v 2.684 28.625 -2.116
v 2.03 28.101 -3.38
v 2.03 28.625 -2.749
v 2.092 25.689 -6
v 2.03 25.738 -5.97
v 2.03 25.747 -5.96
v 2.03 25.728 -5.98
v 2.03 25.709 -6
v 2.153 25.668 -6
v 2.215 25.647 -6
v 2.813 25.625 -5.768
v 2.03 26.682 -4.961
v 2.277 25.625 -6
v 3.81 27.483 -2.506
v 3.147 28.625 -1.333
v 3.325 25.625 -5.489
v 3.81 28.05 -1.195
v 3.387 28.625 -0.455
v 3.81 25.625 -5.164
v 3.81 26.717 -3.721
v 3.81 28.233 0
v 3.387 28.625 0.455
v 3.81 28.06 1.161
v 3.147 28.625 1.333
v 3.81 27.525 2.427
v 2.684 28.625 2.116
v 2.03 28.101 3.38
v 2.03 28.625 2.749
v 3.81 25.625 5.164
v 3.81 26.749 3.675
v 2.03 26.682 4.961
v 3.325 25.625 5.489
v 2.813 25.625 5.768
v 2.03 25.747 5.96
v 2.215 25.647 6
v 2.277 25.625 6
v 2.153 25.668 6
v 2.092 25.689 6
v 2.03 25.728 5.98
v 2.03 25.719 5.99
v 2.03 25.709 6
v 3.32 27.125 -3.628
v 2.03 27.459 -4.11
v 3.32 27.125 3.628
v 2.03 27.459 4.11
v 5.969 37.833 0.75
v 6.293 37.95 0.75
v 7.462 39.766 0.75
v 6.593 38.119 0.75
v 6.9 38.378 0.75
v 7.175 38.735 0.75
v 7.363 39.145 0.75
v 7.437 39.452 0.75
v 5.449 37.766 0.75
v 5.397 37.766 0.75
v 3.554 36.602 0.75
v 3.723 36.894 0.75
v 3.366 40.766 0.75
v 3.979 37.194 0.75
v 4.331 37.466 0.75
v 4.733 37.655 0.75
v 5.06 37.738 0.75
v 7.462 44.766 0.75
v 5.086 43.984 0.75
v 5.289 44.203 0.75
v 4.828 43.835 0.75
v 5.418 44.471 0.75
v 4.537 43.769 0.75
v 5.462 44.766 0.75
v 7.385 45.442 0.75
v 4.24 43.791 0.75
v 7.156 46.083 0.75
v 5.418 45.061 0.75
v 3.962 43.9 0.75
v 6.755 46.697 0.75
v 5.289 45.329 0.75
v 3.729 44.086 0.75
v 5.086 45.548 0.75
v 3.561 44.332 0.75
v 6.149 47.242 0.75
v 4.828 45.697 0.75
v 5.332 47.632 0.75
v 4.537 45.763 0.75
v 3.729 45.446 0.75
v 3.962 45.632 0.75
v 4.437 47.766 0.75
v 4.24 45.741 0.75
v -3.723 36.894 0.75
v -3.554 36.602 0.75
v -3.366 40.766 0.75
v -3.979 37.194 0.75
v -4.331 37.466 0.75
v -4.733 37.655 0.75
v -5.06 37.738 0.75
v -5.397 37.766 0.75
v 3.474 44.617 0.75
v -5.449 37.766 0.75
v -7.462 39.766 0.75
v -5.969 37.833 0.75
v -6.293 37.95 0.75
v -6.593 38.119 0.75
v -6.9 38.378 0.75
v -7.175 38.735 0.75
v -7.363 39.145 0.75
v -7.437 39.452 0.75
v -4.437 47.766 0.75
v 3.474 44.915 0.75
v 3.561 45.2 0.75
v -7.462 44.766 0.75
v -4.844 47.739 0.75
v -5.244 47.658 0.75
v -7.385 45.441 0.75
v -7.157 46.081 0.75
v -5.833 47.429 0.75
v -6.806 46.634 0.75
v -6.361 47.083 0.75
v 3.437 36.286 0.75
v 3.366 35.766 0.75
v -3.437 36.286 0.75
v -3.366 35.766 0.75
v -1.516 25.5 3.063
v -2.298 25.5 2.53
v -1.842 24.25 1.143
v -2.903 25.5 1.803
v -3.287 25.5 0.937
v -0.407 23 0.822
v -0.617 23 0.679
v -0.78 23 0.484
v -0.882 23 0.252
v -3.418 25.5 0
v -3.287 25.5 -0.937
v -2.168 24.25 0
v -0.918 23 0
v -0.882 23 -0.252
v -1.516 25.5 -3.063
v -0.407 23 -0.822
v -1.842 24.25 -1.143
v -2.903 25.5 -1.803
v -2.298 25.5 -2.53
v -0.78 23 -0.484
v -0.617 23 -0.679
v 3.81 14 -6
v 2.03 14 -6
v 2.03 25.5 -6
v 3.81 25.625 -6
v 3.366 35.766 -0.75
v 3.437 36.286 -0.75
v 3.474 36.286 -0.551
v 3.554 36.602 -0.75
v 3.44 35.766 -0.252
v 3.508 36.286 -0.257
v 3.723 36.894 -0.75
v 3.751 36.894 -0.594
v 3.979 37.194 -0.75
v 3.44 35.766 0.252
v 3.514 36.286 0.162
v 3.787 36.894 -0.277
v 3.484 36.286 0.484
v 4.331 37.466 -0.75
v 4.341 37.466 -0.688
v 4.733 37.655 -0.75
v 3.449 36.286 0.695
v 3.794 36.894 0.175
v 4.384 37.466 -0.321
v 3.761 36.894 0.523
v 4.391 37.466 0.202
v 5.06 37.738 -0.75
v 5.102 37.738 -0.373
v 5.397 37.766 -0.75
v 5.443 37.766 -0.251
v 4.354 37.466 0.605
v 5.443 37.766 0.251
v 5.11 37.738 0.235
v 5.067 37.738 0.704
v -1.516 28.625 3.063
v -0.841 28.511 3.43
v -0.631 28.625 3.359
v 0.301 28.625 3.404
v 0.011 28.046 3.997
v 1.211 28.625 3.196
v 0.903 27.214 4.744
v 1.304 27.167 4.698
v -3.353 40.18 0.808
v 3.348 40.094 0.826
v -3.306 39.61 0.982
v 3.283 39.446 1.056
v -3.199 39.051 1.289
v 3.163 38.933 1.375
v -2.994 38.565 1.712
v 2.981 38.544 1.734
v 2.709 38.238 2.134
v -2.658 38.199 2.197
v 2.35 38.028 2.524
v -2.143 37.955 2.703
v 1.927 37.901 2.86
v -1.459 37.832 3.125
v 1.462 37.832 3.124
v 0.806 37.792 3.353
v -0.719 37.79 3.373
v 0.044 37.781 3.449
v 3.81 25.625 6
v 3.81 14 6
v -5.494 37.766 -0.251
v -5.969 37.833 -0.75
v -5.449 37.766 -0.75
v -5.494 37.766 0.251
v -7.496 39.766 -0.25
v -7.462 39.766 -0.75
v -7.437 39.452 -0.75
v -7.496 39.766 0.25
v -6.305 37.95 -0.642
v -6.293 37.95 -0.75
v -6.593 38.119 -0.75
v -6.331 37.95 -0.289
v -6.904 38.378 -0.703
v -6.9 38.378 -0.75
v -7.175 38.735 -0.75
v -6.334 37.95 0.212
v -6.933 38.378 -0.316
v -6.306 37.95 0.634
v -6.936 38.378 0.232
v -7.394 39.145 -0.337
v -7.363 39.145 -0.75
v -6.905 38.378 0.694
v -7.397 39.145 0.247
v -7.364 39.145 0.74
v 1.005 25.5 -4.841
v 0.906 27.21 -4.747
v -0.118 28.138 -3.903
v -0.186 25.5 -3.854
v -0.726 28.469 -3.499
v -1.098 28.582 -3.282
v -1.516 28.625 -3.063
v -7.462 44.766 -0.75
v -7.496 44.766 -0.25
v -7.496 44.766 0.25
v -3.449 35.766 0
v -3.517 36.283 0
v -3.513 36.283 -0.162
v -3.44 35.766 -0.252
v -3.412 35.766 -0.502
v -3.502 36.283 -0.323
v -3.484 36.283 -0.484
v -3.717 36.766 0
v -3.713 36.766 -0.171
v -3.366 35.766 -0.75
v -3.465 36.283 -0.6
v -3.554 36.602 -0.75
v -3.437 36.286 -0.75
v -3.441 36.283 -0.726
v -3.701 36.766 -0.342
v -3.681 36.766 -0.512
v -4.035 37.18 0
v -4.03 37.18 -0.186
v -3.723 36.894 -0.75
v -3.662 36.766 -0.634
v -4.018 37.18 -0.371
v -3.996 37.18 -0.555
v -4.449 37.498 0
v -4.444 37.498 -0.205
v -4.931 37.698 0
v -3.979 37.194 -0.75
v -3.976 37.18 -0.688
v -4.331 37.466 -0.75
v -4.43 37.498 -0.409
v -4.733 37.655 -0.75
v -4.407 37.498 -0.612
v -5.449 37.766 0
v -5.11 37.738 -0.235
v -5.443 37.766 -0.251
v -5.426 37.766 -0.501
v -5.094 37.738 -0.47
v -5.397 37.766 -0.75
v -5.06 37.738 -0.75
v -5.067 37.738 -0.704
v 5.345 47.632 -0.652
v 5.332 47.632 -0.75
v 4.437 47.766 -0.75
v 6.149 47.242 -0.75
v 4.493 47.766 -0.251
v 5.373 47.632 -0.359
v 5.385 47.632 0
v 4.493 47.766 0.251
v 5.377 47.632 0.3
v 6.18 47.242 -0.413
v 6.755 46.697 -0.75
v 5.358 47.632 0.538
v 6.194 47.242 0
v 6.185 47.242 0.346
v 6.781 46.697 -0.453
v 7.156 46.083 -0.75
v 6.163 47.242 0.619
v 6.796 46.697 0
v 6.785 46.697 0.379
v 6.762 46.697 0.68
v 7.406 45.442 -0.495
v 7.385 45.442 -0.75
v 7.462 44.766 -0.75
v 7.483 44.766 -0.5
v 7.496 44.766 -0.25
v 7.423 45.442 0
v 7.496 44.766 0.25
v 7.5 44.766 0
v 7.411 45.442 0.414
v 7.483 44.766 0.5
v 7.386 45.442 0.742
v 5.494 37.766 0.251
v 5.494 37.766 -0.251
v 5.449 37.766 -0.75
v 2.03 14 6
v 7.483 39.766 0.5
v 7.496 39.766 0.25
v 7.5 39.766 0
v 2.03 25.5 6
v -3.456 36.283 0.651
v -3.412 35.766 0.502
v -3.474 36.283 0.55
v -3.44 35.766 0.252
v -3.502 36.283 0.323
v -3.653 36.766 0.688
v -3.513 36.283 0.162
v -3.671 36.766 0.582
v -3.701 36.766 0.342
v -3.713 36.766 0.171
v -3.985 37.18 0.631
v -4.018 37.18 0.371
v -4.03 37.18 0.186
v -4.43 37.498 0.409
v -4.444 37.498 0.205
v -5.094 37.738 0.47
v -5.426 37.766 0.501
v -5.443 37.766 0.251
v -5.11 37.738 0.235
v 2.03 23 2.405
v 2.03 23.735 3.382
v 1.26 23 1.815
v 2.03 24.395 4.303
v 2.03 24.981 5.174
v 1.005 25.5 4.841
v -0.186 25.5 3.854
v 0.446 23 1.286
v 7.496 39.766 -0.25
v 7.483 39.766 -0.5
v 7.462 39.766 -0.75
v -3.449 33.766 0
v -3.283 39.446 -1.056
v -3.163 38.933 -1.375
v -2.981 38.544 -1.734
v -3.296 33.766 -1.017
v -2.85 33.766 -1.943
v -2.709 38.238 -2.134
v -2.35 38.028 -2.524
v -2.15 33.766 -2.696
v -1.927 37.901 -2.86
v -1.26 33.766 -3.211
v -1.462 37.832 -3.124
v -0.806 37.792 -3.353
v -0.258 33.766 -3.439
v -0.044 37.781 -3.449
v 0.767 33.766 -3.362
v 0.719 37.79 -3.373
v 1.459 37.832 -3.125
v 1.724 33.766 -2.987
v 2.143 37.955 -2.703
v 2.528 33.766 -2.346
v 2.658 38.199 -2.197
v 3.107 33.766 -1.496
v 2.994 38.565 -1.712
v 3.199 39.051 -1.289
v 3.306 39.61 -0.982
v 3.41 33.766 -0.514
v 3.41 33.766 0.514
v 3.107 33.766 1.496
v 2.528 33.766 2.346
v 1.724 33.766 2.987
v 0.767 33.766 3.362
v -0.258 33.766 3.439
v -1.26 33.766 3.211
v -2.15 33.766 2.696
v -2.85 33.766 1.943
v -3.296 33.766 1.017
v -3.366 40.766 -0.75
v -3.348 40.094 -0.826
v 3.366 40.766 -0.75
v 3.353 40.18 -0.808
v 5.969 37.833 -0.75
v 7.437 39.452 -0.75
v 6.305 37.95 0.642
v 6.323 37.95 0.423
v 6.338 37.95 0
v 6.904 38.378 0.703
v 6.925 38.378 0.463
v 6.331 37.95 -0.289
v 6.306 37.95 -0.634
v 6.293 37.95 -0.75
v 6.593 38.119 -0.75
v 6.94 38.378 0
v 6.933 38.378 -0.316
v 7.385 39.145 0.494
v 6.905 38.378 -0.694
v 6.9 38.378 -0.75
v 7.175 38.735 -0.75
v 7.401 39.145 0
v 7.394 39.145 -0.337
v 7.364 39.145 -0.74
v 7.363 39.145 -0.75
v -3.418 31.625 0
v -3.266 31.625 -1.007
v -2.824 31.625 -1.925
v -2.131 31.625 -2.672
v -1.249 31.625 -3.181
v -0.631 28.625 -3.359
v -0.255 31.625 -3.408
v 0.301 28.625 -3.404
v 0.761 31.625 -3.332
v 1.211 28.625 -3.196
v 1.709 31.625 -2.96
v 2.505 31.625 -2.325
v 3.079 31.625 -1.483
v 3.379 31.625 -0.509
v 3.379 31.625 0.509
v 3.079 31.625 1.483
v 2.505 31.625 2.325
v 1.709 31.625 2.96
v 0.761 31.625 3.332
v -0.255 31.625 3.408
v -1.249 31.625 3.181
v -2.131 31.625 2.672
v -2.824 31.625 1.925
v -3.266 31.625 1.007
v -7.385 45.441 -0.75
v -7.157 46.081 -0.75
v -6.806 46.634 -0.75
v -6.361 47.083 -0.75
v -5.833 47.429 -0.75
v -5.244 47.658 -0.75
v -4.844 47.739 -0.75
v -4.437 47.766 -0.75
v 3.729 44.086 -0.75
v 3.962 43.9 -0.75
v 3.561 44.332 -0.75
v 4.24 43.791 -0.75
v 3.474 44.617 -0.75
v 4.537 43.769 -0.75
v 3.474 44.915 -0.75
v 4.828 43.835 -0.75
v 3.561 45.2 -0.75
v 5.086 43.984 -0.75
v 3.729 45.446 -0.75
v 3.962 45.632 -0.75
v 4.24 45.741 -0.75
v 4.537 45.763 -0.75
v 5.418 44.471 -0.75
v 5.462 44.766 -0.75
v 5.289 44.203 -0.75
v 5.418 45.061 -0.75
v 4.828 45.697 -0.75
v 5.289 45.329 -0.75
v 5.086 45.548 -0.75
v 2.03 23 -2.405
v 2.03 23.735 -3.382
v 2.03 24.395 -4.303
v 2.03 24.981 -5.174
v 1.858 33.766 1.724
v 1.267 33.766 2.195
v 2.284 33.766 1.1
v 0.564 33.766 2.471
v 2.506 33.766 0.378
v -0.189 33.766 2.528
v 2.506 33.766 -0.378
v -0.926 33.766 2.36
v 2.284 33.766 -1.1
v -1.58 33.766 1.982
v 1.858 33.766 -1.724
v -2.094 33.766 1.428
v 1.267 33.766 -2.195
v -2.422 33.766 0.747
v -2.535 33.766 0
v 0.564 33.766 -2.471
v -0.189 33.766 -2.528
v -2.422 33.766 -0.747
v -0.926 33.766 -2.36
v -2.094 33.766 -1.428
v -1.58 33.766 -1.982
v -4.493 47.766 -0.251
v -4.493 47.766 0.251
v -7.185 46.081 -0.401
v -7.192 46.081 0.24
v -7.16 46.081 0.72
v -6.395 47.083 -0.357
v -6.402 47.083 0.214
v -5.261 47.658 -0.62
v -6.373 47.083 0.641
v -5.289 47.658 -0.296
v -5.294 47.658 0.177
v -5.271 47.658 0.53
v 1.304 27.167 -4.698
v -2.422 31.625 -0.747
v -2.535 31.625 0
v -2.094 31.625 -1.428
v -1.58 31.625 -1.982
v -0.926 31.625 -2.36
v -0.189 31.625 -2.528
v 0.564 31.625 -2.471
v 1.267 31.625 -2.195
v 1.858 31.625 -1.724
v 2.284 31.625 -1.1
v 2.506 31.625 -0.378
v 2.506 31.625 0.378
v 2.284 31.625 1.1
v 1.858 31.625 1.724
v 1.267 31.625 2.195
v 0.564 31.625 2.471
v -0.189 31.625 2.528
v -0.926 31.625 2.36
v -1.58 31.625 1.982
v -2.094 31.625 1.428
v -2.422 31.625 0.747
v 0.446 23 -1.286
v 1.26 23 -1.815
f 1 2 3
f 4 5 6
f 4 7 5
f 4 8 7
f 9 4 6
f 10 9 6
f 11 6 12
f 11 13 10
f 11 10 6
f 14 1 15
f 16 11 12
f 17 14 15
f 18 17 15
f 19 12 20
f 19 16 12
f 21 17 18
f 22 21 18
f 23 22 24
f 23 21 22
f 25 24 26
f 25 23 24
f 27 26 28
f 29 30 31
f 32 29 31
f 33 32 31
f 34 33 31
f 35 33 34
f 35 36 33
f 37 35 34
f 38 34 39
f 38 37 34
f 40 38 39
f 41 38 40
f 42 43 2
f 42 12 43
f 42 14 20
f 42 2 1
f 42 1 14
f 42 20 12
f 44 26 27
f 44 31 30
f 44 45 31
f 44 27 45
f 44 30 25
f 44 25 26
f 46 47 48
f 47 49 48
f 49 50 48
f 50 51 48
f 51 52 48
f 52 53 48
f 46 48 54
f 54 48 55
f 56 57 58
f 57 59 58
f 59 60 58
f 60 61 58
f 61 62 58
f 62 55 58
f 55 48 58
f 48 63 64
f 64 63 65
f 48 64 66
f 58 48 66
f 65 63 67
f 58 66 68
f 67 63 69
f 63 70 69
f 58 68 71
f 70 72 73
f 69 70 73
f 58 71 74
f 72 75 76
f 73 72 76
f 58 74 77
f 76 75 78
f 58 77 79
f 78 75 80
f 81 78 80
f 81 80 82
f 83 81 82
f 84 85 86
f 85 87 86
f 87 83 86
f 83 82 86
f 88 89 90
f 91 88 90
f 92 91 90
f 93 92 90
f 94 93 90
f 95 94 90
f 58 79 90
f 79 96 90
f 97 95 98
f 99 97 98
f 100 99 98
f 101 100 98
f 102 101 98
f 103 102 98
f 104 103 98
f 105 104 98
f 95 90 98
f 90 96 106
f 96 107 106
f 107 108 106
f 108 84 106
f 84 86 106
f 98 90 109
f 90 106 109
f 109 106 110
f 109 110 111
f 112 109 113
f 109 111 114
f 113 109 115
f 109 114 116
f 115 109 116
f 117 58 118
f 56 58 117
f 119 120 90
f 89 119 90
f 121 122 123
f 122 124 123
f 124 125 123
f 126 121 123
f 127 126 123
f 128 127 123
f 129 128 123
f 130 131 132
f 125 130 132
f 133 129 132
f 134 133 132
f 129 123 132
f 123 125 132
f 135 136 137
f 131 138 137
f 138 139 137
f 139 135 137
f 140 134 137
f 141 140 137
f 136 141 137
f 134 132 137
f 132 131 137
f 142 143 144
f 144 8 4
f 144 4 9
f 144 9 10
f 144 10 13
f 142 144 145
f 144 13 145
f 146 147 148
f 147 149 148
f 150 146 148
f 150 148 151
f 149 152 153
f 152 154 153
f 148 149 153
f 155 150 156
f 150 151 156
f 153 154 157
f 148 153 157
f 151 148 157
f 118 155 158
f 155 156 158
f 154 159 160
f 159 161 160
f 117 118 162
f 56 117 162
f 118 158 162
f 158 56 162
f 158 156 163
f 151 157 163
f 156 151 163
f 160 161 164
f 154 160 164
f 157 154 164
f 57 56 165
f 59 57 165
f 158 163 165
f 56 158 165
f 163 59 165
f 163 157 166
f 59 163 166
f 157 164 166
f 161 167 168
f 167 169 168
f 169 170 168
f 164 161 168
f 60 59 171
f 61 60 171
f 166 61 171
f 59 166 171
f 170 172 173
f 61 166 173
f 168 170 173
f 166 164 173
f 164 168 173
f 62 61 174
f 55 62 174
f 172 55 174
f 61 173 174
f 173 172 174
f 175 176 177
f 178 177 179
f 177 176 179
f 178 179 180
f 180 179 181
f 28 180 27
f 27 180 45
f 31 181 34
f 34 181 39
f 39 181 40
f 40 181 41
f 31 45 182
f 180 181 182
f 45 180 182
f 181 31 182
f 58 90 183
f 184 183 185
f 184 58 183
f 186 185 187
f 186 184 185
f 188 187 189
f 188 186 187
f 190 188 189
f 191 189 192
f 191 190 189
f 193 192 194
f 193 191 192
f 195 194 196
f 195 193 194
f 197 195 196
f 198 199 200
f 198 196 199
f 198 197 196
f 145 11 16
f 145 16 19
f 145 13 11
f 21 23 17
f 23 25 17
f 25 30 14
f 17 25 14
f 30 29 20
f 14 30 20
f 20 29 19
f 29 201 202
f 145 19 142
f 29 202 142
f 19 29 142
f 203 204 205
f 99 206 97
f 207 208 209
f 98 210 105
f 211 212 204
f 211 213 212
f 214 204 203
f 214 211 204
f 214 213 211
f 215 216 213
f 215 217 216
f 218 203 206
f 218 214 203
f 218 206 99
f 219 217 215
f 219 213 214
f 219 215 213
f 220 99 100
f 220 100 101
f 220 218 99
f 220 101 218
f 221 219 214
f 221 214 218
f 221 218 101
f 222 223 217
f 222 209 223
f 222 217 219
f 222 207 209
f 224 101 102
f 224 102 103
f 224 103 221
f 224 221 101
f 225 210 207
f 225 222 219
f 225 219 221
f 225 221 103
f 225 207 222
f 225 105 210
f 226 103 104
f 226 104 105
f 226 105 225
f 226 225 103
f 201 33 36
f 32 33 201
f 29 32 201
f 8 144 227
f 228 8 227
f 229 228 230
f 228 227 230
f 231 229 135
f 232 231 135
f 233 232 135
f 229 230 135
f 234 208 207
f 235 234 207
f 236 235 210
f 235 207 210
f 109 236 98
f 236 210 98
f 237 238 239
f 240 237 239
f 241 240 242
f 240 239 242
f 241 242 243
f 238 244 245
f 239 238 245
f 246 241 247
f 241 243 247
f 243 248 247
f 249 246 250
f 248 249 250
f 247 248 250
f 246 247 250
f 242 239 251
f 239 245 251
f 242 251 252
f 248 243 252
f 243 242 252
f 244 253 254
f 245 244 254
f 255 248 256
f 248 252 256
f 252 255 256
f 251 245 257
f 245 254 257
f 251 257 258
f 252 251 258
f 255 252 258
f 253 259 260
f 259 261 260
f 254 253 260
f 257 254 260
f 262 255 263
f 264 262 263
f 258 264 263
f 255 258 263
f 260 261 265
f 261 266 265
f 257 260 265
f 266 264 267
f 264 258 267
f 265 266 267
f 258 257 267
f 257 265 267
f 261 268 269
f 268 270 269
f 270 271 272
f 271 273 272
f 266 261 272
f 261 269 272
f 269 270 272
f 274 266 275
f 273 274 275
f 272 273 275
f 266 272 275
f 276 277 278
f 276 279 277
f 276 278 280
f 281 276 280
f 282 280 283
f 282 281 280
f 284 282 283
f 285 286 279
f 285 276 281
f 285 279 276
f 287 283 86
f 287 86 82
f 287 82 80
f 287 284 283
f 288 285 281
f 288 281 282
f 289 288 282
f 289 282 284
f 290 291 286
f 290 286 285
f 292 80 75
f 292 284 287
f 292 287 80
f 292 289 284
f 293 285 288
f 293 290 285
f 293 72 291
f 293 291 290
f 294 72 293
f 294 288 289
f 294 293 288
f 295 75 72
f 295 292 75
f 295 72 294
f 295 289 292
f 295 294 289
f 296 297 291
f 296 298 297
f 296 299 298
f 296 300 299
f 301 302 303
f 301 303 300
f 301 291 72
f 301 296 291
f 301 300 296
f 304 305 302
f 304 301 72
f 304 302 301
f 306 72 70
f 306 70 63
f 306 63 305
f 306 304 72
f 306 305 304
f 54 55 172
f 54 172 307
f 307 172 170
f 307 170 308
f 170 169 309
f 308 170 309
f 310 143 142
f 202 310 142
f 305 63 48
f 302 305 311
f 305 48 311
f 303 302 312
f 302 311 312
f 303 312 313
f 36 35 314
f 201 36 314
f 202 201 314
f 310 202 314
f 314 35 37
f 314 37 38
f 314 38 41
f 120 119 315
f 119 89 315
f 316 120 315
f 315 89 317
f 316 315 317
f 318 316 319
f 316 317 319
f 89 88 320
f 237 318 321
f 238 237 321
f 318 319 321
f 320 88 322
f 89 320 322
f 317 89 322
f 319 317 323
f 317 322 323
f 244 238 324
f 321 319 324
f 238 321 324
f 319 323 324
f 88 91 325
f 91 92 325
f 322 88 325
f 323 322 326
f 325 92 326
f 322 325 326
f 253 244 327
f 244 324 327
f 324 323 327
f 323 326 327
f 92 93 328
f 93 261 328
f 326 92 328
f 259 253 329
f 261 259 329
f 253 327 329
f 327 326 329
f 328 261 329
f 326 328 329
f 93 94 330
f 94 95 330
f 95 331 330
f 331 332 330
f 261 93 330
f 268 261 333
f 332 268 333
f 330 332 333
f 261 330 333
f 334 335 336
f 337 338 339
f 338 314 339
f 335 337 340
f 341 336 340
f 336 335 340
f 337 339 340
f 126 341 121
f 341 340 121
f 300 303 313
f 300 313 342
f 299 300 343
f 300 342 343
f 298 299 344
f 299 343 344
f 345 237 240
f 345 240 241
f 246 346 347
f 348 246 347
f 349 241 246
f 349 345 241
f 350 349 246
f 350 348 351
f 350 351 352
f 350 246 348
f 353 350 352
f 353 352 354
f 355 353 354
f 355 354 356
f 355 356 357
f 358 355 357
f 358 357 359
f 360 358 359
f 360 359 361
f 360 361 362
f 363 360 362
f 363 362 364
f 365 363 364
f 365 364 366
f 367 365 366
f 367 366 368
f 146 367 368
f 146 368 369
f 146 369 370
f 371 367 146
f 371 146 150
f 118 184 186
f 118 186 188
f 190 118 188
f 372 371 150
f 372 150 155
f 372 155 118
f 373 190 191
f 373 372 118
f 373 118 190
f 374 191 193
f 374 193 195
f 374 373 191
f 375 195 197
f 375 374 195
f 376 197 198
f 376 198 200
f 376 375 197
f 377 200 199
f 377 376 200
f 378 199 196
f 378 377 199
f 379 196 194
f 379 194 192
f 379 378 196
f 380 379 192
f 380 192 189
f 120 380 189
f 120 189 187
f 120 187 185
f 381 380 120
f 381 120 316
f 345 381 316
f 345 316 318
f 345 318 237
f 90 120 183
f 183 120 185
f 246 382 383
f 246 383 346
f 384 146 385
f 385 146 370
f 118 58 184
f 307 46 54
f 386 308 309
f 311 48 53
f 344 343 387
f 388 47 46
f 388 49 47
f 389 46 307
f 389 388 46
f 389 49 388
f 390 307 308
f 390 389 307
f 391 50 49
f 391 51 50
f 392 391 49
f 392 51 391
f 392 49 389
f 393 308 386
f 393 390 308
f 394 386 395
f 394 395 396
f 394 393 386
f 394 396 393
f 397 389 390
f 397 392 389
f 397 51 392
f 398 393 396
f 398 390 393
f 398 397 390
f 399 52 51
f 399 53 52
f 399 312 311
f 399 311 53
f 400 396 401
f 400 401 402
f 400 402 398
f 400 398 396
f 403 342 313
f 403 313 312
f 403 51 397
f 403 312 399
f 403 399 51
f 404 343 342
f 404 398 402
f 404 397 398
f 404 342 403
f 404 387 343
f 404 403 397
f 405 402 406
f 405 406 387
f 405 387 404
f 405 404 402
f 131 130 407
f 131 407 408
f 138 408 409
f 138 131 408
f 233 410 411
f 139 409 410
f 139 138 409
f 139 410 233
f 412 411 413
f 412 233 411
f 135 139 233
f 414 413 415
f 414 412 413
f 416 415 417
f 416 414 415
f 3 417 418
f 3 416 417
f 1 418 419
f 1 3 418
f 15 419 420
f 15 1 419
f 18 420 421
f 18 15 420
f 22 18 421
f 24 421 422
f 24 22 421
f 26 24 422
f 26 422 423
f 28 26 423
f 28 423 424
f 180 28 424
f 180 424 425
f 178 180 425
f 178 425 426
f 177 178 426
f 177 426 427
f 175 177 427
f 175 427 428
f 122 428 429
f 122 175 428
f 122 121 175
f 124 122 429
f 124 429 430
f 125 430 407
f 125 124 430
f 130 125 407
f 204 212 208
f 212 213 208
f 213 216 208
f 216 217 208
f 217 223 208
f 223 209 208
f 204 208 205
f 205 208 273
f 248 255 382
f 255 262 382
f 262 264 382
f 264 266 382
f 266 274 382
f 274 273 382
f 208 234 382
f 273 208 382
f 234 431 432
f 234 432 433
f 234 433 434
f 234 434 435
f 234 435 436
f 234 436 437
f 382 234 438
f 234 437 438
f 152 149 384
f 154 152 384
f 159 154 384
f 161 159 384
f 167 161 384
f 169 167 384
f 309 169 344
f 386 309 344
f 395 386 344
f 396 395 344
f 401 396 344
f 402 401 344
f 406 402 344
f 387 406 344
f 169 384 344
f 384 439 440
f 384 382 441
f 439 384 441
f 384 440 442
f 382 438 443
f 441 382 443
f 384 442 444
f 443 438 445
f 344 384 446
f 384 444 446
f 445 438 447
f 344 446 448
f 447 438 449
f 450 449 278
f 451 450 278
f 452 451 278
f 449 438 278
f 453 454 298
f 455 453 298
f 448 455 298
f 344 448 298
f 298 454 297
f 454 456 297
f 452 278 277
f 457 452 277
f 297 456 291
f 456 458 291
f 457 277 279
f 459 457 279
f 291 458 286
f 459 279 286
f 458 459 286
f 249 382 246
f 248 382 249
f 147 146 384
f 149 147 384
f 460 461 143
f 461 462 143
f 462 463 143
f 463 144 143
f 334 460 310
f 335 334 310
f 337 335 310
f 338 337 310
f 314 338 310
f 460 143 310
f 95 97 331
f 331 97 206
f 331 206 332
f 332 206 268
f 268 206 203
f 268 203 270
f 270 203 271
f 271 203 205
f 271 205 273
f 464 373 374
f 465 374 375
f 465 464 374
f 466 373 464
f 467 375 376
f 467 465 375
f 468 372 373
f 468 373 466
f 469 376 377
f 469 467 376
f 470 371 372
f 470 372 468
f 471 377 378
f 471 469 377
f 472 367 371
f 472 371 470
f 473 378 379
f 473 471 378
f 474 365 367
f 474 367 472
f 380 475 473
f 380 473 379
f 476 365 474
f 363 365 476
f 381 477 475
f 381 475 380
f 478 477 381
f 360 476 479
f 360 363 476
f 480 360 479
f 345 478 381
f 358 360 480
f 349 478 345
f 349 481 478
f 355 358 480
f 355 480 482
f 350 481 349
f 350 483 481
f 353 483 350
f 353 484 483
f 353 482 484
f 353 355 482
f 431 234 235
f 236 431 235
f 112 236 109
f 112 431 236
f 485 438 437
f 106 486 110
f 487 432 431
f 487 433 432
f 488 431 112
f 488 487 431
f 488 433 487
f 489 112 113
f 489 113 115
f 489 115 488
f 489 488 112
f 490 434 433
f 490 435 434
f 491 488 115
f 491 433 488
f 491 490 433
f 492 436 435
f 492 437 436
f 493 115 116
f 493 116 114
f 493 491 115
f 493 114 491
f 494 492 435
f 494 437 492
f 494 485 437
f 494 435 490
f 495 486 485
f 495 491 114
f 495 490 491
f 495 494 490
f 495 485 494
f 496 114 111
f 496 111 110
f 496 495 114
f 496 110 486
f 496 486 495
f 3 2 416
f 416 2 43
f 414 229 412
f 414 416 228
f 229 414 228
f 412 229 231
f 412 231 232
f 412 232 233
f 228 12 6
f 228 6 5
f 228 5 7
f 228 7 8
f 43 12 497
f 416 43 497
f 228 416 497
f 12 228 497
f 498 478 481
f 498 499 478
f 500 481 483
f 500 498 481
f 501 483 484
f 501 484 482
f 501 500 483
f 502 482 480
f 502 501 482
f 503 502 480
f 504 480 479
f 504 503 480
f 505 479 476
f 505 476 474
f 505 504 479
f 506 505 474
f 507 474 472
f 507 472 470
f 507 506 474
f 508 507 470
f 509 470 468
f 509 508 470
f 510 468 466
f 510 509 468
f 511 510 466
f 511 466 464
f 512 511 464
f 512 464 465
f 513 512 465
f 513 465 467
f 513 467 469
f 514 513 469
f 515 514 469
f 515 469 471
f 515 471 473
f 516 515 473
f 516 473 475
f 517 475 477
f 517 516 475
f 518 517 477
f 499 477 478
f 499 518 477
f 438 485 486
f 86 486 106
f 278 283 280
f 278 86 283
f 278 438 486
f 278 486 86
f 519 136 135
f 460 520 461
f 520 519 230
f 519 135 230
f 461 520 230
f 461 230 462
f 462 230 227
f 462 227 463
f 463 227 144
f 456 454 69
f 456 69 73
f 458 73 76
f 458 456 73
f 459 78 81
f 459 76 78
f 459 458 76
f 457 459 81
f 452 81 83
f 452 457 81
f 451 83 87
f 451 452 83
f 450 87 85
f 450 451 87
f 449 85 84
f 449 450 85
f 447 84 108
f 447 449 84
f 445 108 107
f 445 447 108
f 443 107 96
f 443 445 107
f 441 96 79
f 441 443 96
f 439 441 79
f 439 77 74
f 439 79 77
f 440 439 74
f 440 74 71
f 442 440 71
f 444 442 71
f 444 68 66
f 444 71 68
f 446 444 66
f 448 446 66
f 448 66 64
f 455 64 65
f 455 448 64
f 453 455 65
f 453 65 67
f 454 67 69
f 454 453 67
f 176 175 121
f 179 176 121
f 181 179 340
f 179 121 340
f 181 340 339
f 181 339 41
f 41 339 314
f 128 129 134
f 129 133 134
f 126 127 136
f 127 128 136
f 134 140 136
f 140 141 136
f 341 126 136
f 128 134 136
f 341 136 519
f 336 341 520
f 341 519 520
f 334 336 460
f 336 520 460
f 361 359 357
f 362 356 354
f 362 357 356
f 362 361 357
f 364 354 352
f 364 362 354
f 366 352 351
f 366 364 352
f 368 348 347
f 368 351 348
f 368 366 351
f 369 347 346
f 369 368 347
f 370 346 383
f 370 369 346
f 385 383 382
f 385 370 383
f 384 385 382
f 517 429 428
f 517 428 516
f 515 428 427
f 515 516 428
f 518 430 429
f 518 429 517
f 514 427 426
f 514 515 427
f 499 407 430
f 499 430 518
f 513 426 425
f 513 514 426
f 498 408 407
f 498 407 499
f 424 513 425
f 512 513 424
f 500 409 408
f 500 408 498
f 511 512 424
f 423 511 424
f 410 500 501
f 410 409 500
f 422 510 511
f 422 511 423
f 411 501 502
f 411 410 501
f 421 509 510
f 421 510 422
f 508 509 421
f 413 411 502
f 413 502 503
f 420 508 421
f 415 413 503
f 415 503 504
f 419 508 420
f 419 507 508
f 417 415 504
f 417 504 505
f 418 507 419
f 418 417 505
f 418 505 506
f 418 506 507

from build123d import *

# Parameters (mm, degrees)
BOSS_EXTRUDE1_DEPTH      = 10
FILLET2_R                = 2
FILLET3_R                = 3
CUT_EXTRUDE1_DEPTH       = 49.473897211
CUT_EXTRUDE1_DEPTH_BACK  = 49.473897211
SKETCH3_R                = 1
BOSS_EXTRUDE2_DEPTH      = 6
BOSS_EXTRUDE2_DEPTH_BACK = 6
SKETCH4_W                = 1.78
SKETCH4_H                = 11.625349657
CHAMFER1_SIZE            = 3
FILLET4_START            = 23
FILLET4_DEPTH            = 2.747219164
FILLET4_START_2          = 25.747219164
FILLET4_2_DEPTH          = 2.878130593
CHAMFER2_SIZE            = 2.5


with BuildPart() as part:
    # Sketch1 → Revolve1 (revolve)
    with BuildSketch(Plane.XY):
        Polygon((-3.448914015, 37.765821371), (-3.448914015, 33.765821371), (-2.534753992, 33.765821371), (-2.534753992, 31.624967984), (-3.41766068, 31.624967984), (-3.41766068, 23), (0, 23), (0, 37.765821371), align=None)
    revolve(axis=Axis((0, 37.765821371, 0), (0, -1, 0)))

    # Sketch2 → Boss-Extrude1 (add)
    with BuildSketch(Plane(origin=(0, 37.765821371, 0), x_dir=(1, 0, 0), z_dir=(0, 1, 0))):
        with BuildLine():
            Line((3.366379046, 0.75), (-3.366379046, 0.75))
            ThreePointArc((-3.366379046, 0.75), (-3.448914015, 0), (-3.366379046, -0.75))
            Line((-3.366379046, -0.75), (3.366379046, -0.75))
            ThreePointArc((3.366379046, -0.75), (3.428218178, -0.37726384), (3.448914015, 0))
            ThreePointArc((3.448914015, 0), (3.428218178, 0.37726384), (3.366379046, 0.75))
        make_face()
        with BuildLine():
            Line((-3.366379046, 0.75), (-7.462405778, 0.75))
            ThreePointArc((-7.462405778, 0.75), (-7.5, 0), (-7.462405778, -0.75))
            Line((-7.462405778, -0.75), (-3.366379046, -0.75))
            ThreePointArc((-3.366379046, -0.75), (-3.448914015, 0), (-3.366379046, 0.75))
        make_face()
        with BuildLine():
            ThreePointArc((7.5, 0), (7.490595548, 0.375470813), (7.462405778, 0.75))
            Line((7.462405778, 0.75), (3.366379046, 0.75))
            ThreePointArc((3.366379046, 0.75), (3.428218178, 0.37726384), (3.448914015, 0))
            ThreePointArc((3.448914015, 0), (3.428218178, -0.37726384), (3.366379046, -0.75))
            Line((3.366379046, -0.75), (7.462405778, -0.75))
            ThreePointArc((7.462405778, -0.75), (7.490595548, -0.375470813), (7.5, 0))
        make_face()
    extrude(amount=BOSS_EXTRUDE1_DEPTH)

    # Fillet2
    # the kernel refuses this fillet: 2 mm, written as the material it adds along each edge
    with BuildSketch(Plane(origin=(0, 37.765821371, 0), x_dir=(-0.09803421101524086, 0, -0.9951830452085783), z_dir=(-0.9951830452085783, 0, 0.09803421101524086))) as fillet2_piece_1_section:
        with BuildLine():
            CenterArc((3.448914015 + FILLET2_R, FILLET2_R), FILLET2_R, 180, 90)
            Line((3.448914015 + FILLET2_R, 0), (3.448914015, 0))
            Line((3.448914015, 0), (3.448914015, FILLET2_R))
        make_face()
    fillet2_piece_1 = revolve(axis=Axis((0, 37.765821371, 0), (0, -1, 0)), revolution_arc=191.251965623, mode=Mode.PRIVATE)
    fillet2_piece_1 = split(fillet2_piece_1, bisect_by=Plane(origin=(0, 37.765821371, -0.75), z_dir=(0, 0, 1)), keep=Keep.TOP, mode=Mode.PRIVATE)
    fillet2_piece_1 = split(fillet2_piece_1, bisect_by=Plane(origin=(0, 37.765821371, 0.75), z_dir=(0, 0, -1)), keep=Keep.TOP, mode=Mode.PRIVATE)
    add(fillet2_piece_1)
    with BuildSketch(Plane(origin=(0, 37.765821371, 0), x_dir=(0.09800035789508027, 0, 0.9951863794548418), z_dir=(0.9951863794548418, 0, -0.09800035789508027))) as fillet2_piece_2_section:
        with BuildLine():
            CenterArc((3.448914015 + FILLET2_R, FILLET2_R), FILLET2_R, 180, 90)
            Line((3.448914015 + FILLET2_R, 0), (3.448914015, 0))
            Line((3.448914015, 0), (3.448914015, FILLET2_R))
        make_face()
    fillet2_piece_2 = revolve(axis=Axis((0, 37.765821371, 0), (0, -1, 0)), revolution_arc=95.624033786, mode=Mode.PRIVATE)
    fillet2_piece_2 = split(fillet2_piece_2, bisect_by=Plane(origin=(0, 37.765821371, 0.75), z_dir=(0, 0, -1)), keep=Keep.TOP, mode=Mode.PRIVATE)
    add(fillet2_piece_2)
    with BuildSketch(Plane(origin=(0, 37.765821371, 0), x_dir=(-1, 0, 0), z_dir=(0, 0, 1))) as fillet2_piece_3_section:
        with BuildLine():
            CenterArc((3.448914015 + FILLET2_R, FILLET2_R), FILLET2_R, 180, 90)
            Line((3.448914015 + FILLET2_R, 0), (3.448914015, 0))
            Line((3.448914015, 0), (3.448914015, FILLET2_R))
        make_face()
    fillet2_piece_3 = revolve(axis=Axis((0, 37.765821371, 0), (0, -1, 0)), revolution_arc=95.624033786, mode=Mode.PRIVATE)
    fillet2_piece_3 = split(fillet2_piece_3, bisect_by=Plane(origin=(0, 37.765821371, -0.75), z_dir=(0, 0, 1)), keep=Keep.TOP, mode=Mode.PRIVATE)
    add(fillet2_piece_3)
    # the kernel refuses this fillet: 2 mm, written as the material it takes off along each edge
    with BuildSketch(Plane(origin=(0, 37.765821371, 0), x_dir=(-0.7201079494948177, 0, -0.6938620475817721), z_dir=(0.6938620475817721, 0, -0.7201079494948177))) as fillet2_2_piece_1:
        with BuildLine():
            CenterArc((7.5 - FILLET2_R, FILLET2_R), FILLET2_R, 270, 90)
            Line((7.5, FILLET2_R), (7.5, 0))
            Line((7.5, 0), (7.5 - FILLET2_R, 0))
        make_face()
    revolve(axis=Axis((0, 37.765821371, 0), (0, 1, 0)), revolution_arc=87.873212667, mode=Mode.SUBTRACT)
    with BuildSketch(Plane(origin=(0, 37.765821371, 0), x_dir=(0.7201079494948216, 0, 0.6938620475817678), z_dir=(-0.6938620475817678, 0, 0.7201079494948216))) as fillet2_2_piece_2:
        with BuildLine():
            CenterArc((7.5 - FILLET2_R, FILLET2_R), FILLET2_R, 270, 90)
            Line((7.5 - FILLET2_R, 0), (7.5, 0))
            Line((7.5, 0), (7.5, FILLET2_R))
        make_face()
    revolve(axis=Axis((0, 37.765821371, 0), (0, 1, 0)), revolution_arc=87.873212667, mode=Mode.SUBTRACT)

    # Fillet3
    # the kernel refuses this fillet: 3 mm, written as the material it adds along each edge
    with BuildSketch(Plane(origin=(10.866379046, 37.765821371, -0.75), x_dir=(0, 1, 0), z_dir=(-1, 0, 0))) as fillet3_piece_1_section:
        with BuildLine():
            CenterArc((FILLET3_R, FILLET3_R), FILLET3_R, 180, 90)
            Line((0, FILLET3_R), (0, 0))
            Line((0, 0), (FILLET3_R, 0))
        make_face()
    fillet3_piece_1 = extrude(amount=21.732758092, mode=Mode.PRIVATE)
    fillet3_piece_1 = fillet3_piece_1 & Plane(origin=(0, 37.765821371, 0), x_dir=(-1, 0, 0), z_dir=(0, -1, 0)) * Cylinder(3.448914015, 56, mode=Mode.PRIVATE)
    add(fillet3_piece_1)
    with BuildSketch(Plane(origin=(10.866379046, 37.765821371, 0.75), x_dir=(0, 1, 0), z_dir=(-1, 0, 0))) as fillet3_piece_2_section:
        with BuildLine():
            CenterArc((FILLET3_R, -FILLET3_R), FILLET3_R, 90, 90)
            Line((0, -FILLET3_R), (0, 0))
            Line((0, 0), (FILLET3_R, 0))
        make_face()
    fillet3_piece_2 = extrude(amount=21.732758092, mode=Mode.PRIVATE)
    fillet3_piece_2 = fillet3_piece_2 & Plane(origin=(0, 37.765821371, 0), x_dir=(-1, 0, 0), z_dir=(0, -1, 0)) * Cylinder(3.448914015, 56, mode=Mode.PRIVATE)
    add(fillet3_piece_2)
    # the kernel refuses this fillet: 3 mm, written as the material it takes off along each edge
    with BuildSketch(Plane(origin=(0, 47.765821371, 0), x_dir=(-0.4534410859899706, 0, -0.8912862511764871), z_dir=(0.8912862511764871, 0, -0.4534410859899706))) as fillet3_2_piece_1:
        with BuildLine():
            CenterArc((7.5 - FILLET3_R, -FILLET3_R), FILLET3_R, 0, 90)
            Line((7.5 - FILLET3_R, 0), (7.5, 0))
            Line((7.5, 0), (7.5, -FILLET3_R))
        make_face()
    revolve(axis=Axis((0, 47.765821371, 0), (0, 1, 0)), revolution_arc=126.070648523, mode=Mode.SUBTRACT)
    with BuildSketch(Plane(origin=(0, 47.765821371, 0), x_dir=(0.4534410859901425, 0, -0.8912862511763997), z_dir=(-0.8912862511763997, 0, -0.4534410859901425))) as fillet3_2_piece_2:
        with BuildLine():
            CenterArc((7.5 - FILLET3_R, FILLET3_R), FILLET3_R, 270, 90)
            Line((7.5, FILLET3_R), (7.5, 0))
            Line((7.5, 0), (7.5 - FILLET3_R, 0))
        make_face()
    revolve(axis=Axis((0, 47.765821371, 0), (0, -1, 0)), revolution_arc=126.070648523, mode=Mode.SUBTRACT)

    # Sketch3 → Cut-Extrude1 (cut, two sides: drawn at the far end of the back side and taken through both)
    with BuildSketch(Plane.XY.offset(-CUT_EXTRUDE1_DEPTH_BACK)):
        with Locations((4.462405778, 44.765821371)):
            Circle(SKETCH3_R)
    extrude(amount=CUT_EXTRUDE1_DEPTH + CUT_EXTRUDE1_DEPTH_BACK, mode=Mode.SUBTRACT)

    # Sketch4 → Boss-Extrude2 (add, two sides: drawn at the far end of the back side and taken through both)
    with BuildSketch(Plane.XY.offset(-BOSS_EXTRUDE2_DEPTH_BACK)):
        with Locations((2.92, 19.812674829)):
            Rectangle(SKETCH4_W, SKETCH4_H)
    extrude(amount=BOSS_EXTRUDE2_DEPTH + BOSS_EXTRUDE2_DEPTH_BACK)

    # Chamfer1
    # the kernel refuses this chamfer: 3 mm, written as the material it adds along each edge
    with BuildSketch(Plane(origin=(0, 25.625349657, 0), x_dir=(-0.9999950652018582, 0, -0.003141587485879368), z_dir=(-0.003141587485879368, 0, 0.9999950652018582))) as chamfer1_piece_1_section:
        Polygon((3.41766068, -CHAMFER1_SIZE), (3.41766068 + CHAMFER1_SIZE, 0), (3.41766068, 0), align=None)
    chamfer1_piece_1 = revolve(axis=Axis((0, 25.625349657, 0), (0, -1, 0)), revolution_arc=359.64, mode=Mode.PRIVATE)
    chamfer1_piece_1 = split(chamfer1_piece_1, bisect_by=Plane(origin=(2.03, 25.625349657, 0), z_dir=(1, 0, 0)), keep=Keep.TOP, mode=Mode.PRIVATE)
    chamfer1_piece_1 = split(chamfer1_piece_1, bisect_by=Plane(origin=(0, 25.625349657, -6), z_dir=(0, 0, 1)), keep=Keep.TOP, mode=Mode.PRIVATE)
    chamfer1_piece_1 = split(chamfer1_piece_1, bisect_by=Plane(origin=(3.81, 25.625349657, 0), z_dir=(-1, 0, 0)), keep=Keep.TOP, mode=Mode.PRIVATE)
    chamfer1_piece_1 = split(chamfer1_piece_1, bisect_by=Plane(origin=(0, 25.625349657, 6), z_dir=(0, 0, -1)), keep=Keep.TOP, mode=Mode.PRIVATE)
    add(chamfer1_piece_1)

    # Fillet4: read off the stored shape, not the designer's step
    # Fillet4 outline → Fillet4 (add)
    with BuildSketch(Plane(origin=(0, 0, 0), x_dir=(1, 0, 0), z_dir=(0, 1, 0)).offset(FILLET4_START)):
        with BuildLine():
            Line((2.03, 2.749455314), (2.03, 6))
            ThreePointArc((2.03, 6), (0.428490728, 4.324777263), (-1.515640098, 3.063207407))
            ThreePointArc((-1.515640098, 3.063207407), (0.301250097, 3.404357928), (2.03, 2.749455314))
        make_face()
        with BuildLine():
            ThreePointArc((2.03, -2.749455314), (0.301250097, -3.404357928), (-1.515640098, -3.063207407))
            ThreePointArc((-1.515640098, -3.063207407), (0.428490728, -4.324777263), (2.03, -6))
            Line((2.03, -6), (2.03, -2.749455314))
        make_face()
    extrude(amount=FILLET4_DEPTH)

    # Fillet4 2 outline → Fillet4 2 (add)
    with BuildSketch(Plane(origin=(0, 0, 0), x_dir=(1, 0, 0), z_dir=(0, 1, 0)).offset(FILLET4_START_2)):
        with BuildLine():
            Line((2.03, 2.749455314), (2.03, 6))
            ThreePointArc((2.03, 6), (0.428490728, 4.324777263), (-1.515640098, 3.063207407))
            ThreePointArc((-1.515640098, 3.063207407), (0.301250097, 3.404357928), (2.03, 2.749455314))
        make_face()
        with BuildLine():
            ThreePointArc((2.03, -2.749455314), (0.301250097, -3.404357928), (-1.515640098, -3.063207407))
            ThreePointArc((-1.515640098, -3.063207407), (0.428490728, -4.324777263), (2.03, -6))
            Line((2.03, -6), (2.03, -2.749455314))
        make_face()
    extrude(amount=FILLET4_2_DEPTH)

    # Fillet4 3 outline → Fillet4 3 (revolve, cut)
    with BuildSketch(Plane.XY):
        Polygon((6.334106093, 28.625349757), (3.41766068, 28.625349757), (6.41766068, 25.625349657), (6.41766068, 28.62535645), align=None)
    revolve(axis=Axis((0, 0, 0), (0, 1, 0)), mode=Mode.SUBTRACT)

    # Chamfer2
    chamfer2_edges = [part.edges().sort_by_distance(p)[0] for p in [
        (-2.903476201, 23, 1.80283956),
        (0.428490728, 23, -4.324777263),
        (0.428490728, 23, 4.324777263),
    ]]
    chamfer(chamfer2_edges, length=CHAMFER2_SIZE)


solid = part.part
